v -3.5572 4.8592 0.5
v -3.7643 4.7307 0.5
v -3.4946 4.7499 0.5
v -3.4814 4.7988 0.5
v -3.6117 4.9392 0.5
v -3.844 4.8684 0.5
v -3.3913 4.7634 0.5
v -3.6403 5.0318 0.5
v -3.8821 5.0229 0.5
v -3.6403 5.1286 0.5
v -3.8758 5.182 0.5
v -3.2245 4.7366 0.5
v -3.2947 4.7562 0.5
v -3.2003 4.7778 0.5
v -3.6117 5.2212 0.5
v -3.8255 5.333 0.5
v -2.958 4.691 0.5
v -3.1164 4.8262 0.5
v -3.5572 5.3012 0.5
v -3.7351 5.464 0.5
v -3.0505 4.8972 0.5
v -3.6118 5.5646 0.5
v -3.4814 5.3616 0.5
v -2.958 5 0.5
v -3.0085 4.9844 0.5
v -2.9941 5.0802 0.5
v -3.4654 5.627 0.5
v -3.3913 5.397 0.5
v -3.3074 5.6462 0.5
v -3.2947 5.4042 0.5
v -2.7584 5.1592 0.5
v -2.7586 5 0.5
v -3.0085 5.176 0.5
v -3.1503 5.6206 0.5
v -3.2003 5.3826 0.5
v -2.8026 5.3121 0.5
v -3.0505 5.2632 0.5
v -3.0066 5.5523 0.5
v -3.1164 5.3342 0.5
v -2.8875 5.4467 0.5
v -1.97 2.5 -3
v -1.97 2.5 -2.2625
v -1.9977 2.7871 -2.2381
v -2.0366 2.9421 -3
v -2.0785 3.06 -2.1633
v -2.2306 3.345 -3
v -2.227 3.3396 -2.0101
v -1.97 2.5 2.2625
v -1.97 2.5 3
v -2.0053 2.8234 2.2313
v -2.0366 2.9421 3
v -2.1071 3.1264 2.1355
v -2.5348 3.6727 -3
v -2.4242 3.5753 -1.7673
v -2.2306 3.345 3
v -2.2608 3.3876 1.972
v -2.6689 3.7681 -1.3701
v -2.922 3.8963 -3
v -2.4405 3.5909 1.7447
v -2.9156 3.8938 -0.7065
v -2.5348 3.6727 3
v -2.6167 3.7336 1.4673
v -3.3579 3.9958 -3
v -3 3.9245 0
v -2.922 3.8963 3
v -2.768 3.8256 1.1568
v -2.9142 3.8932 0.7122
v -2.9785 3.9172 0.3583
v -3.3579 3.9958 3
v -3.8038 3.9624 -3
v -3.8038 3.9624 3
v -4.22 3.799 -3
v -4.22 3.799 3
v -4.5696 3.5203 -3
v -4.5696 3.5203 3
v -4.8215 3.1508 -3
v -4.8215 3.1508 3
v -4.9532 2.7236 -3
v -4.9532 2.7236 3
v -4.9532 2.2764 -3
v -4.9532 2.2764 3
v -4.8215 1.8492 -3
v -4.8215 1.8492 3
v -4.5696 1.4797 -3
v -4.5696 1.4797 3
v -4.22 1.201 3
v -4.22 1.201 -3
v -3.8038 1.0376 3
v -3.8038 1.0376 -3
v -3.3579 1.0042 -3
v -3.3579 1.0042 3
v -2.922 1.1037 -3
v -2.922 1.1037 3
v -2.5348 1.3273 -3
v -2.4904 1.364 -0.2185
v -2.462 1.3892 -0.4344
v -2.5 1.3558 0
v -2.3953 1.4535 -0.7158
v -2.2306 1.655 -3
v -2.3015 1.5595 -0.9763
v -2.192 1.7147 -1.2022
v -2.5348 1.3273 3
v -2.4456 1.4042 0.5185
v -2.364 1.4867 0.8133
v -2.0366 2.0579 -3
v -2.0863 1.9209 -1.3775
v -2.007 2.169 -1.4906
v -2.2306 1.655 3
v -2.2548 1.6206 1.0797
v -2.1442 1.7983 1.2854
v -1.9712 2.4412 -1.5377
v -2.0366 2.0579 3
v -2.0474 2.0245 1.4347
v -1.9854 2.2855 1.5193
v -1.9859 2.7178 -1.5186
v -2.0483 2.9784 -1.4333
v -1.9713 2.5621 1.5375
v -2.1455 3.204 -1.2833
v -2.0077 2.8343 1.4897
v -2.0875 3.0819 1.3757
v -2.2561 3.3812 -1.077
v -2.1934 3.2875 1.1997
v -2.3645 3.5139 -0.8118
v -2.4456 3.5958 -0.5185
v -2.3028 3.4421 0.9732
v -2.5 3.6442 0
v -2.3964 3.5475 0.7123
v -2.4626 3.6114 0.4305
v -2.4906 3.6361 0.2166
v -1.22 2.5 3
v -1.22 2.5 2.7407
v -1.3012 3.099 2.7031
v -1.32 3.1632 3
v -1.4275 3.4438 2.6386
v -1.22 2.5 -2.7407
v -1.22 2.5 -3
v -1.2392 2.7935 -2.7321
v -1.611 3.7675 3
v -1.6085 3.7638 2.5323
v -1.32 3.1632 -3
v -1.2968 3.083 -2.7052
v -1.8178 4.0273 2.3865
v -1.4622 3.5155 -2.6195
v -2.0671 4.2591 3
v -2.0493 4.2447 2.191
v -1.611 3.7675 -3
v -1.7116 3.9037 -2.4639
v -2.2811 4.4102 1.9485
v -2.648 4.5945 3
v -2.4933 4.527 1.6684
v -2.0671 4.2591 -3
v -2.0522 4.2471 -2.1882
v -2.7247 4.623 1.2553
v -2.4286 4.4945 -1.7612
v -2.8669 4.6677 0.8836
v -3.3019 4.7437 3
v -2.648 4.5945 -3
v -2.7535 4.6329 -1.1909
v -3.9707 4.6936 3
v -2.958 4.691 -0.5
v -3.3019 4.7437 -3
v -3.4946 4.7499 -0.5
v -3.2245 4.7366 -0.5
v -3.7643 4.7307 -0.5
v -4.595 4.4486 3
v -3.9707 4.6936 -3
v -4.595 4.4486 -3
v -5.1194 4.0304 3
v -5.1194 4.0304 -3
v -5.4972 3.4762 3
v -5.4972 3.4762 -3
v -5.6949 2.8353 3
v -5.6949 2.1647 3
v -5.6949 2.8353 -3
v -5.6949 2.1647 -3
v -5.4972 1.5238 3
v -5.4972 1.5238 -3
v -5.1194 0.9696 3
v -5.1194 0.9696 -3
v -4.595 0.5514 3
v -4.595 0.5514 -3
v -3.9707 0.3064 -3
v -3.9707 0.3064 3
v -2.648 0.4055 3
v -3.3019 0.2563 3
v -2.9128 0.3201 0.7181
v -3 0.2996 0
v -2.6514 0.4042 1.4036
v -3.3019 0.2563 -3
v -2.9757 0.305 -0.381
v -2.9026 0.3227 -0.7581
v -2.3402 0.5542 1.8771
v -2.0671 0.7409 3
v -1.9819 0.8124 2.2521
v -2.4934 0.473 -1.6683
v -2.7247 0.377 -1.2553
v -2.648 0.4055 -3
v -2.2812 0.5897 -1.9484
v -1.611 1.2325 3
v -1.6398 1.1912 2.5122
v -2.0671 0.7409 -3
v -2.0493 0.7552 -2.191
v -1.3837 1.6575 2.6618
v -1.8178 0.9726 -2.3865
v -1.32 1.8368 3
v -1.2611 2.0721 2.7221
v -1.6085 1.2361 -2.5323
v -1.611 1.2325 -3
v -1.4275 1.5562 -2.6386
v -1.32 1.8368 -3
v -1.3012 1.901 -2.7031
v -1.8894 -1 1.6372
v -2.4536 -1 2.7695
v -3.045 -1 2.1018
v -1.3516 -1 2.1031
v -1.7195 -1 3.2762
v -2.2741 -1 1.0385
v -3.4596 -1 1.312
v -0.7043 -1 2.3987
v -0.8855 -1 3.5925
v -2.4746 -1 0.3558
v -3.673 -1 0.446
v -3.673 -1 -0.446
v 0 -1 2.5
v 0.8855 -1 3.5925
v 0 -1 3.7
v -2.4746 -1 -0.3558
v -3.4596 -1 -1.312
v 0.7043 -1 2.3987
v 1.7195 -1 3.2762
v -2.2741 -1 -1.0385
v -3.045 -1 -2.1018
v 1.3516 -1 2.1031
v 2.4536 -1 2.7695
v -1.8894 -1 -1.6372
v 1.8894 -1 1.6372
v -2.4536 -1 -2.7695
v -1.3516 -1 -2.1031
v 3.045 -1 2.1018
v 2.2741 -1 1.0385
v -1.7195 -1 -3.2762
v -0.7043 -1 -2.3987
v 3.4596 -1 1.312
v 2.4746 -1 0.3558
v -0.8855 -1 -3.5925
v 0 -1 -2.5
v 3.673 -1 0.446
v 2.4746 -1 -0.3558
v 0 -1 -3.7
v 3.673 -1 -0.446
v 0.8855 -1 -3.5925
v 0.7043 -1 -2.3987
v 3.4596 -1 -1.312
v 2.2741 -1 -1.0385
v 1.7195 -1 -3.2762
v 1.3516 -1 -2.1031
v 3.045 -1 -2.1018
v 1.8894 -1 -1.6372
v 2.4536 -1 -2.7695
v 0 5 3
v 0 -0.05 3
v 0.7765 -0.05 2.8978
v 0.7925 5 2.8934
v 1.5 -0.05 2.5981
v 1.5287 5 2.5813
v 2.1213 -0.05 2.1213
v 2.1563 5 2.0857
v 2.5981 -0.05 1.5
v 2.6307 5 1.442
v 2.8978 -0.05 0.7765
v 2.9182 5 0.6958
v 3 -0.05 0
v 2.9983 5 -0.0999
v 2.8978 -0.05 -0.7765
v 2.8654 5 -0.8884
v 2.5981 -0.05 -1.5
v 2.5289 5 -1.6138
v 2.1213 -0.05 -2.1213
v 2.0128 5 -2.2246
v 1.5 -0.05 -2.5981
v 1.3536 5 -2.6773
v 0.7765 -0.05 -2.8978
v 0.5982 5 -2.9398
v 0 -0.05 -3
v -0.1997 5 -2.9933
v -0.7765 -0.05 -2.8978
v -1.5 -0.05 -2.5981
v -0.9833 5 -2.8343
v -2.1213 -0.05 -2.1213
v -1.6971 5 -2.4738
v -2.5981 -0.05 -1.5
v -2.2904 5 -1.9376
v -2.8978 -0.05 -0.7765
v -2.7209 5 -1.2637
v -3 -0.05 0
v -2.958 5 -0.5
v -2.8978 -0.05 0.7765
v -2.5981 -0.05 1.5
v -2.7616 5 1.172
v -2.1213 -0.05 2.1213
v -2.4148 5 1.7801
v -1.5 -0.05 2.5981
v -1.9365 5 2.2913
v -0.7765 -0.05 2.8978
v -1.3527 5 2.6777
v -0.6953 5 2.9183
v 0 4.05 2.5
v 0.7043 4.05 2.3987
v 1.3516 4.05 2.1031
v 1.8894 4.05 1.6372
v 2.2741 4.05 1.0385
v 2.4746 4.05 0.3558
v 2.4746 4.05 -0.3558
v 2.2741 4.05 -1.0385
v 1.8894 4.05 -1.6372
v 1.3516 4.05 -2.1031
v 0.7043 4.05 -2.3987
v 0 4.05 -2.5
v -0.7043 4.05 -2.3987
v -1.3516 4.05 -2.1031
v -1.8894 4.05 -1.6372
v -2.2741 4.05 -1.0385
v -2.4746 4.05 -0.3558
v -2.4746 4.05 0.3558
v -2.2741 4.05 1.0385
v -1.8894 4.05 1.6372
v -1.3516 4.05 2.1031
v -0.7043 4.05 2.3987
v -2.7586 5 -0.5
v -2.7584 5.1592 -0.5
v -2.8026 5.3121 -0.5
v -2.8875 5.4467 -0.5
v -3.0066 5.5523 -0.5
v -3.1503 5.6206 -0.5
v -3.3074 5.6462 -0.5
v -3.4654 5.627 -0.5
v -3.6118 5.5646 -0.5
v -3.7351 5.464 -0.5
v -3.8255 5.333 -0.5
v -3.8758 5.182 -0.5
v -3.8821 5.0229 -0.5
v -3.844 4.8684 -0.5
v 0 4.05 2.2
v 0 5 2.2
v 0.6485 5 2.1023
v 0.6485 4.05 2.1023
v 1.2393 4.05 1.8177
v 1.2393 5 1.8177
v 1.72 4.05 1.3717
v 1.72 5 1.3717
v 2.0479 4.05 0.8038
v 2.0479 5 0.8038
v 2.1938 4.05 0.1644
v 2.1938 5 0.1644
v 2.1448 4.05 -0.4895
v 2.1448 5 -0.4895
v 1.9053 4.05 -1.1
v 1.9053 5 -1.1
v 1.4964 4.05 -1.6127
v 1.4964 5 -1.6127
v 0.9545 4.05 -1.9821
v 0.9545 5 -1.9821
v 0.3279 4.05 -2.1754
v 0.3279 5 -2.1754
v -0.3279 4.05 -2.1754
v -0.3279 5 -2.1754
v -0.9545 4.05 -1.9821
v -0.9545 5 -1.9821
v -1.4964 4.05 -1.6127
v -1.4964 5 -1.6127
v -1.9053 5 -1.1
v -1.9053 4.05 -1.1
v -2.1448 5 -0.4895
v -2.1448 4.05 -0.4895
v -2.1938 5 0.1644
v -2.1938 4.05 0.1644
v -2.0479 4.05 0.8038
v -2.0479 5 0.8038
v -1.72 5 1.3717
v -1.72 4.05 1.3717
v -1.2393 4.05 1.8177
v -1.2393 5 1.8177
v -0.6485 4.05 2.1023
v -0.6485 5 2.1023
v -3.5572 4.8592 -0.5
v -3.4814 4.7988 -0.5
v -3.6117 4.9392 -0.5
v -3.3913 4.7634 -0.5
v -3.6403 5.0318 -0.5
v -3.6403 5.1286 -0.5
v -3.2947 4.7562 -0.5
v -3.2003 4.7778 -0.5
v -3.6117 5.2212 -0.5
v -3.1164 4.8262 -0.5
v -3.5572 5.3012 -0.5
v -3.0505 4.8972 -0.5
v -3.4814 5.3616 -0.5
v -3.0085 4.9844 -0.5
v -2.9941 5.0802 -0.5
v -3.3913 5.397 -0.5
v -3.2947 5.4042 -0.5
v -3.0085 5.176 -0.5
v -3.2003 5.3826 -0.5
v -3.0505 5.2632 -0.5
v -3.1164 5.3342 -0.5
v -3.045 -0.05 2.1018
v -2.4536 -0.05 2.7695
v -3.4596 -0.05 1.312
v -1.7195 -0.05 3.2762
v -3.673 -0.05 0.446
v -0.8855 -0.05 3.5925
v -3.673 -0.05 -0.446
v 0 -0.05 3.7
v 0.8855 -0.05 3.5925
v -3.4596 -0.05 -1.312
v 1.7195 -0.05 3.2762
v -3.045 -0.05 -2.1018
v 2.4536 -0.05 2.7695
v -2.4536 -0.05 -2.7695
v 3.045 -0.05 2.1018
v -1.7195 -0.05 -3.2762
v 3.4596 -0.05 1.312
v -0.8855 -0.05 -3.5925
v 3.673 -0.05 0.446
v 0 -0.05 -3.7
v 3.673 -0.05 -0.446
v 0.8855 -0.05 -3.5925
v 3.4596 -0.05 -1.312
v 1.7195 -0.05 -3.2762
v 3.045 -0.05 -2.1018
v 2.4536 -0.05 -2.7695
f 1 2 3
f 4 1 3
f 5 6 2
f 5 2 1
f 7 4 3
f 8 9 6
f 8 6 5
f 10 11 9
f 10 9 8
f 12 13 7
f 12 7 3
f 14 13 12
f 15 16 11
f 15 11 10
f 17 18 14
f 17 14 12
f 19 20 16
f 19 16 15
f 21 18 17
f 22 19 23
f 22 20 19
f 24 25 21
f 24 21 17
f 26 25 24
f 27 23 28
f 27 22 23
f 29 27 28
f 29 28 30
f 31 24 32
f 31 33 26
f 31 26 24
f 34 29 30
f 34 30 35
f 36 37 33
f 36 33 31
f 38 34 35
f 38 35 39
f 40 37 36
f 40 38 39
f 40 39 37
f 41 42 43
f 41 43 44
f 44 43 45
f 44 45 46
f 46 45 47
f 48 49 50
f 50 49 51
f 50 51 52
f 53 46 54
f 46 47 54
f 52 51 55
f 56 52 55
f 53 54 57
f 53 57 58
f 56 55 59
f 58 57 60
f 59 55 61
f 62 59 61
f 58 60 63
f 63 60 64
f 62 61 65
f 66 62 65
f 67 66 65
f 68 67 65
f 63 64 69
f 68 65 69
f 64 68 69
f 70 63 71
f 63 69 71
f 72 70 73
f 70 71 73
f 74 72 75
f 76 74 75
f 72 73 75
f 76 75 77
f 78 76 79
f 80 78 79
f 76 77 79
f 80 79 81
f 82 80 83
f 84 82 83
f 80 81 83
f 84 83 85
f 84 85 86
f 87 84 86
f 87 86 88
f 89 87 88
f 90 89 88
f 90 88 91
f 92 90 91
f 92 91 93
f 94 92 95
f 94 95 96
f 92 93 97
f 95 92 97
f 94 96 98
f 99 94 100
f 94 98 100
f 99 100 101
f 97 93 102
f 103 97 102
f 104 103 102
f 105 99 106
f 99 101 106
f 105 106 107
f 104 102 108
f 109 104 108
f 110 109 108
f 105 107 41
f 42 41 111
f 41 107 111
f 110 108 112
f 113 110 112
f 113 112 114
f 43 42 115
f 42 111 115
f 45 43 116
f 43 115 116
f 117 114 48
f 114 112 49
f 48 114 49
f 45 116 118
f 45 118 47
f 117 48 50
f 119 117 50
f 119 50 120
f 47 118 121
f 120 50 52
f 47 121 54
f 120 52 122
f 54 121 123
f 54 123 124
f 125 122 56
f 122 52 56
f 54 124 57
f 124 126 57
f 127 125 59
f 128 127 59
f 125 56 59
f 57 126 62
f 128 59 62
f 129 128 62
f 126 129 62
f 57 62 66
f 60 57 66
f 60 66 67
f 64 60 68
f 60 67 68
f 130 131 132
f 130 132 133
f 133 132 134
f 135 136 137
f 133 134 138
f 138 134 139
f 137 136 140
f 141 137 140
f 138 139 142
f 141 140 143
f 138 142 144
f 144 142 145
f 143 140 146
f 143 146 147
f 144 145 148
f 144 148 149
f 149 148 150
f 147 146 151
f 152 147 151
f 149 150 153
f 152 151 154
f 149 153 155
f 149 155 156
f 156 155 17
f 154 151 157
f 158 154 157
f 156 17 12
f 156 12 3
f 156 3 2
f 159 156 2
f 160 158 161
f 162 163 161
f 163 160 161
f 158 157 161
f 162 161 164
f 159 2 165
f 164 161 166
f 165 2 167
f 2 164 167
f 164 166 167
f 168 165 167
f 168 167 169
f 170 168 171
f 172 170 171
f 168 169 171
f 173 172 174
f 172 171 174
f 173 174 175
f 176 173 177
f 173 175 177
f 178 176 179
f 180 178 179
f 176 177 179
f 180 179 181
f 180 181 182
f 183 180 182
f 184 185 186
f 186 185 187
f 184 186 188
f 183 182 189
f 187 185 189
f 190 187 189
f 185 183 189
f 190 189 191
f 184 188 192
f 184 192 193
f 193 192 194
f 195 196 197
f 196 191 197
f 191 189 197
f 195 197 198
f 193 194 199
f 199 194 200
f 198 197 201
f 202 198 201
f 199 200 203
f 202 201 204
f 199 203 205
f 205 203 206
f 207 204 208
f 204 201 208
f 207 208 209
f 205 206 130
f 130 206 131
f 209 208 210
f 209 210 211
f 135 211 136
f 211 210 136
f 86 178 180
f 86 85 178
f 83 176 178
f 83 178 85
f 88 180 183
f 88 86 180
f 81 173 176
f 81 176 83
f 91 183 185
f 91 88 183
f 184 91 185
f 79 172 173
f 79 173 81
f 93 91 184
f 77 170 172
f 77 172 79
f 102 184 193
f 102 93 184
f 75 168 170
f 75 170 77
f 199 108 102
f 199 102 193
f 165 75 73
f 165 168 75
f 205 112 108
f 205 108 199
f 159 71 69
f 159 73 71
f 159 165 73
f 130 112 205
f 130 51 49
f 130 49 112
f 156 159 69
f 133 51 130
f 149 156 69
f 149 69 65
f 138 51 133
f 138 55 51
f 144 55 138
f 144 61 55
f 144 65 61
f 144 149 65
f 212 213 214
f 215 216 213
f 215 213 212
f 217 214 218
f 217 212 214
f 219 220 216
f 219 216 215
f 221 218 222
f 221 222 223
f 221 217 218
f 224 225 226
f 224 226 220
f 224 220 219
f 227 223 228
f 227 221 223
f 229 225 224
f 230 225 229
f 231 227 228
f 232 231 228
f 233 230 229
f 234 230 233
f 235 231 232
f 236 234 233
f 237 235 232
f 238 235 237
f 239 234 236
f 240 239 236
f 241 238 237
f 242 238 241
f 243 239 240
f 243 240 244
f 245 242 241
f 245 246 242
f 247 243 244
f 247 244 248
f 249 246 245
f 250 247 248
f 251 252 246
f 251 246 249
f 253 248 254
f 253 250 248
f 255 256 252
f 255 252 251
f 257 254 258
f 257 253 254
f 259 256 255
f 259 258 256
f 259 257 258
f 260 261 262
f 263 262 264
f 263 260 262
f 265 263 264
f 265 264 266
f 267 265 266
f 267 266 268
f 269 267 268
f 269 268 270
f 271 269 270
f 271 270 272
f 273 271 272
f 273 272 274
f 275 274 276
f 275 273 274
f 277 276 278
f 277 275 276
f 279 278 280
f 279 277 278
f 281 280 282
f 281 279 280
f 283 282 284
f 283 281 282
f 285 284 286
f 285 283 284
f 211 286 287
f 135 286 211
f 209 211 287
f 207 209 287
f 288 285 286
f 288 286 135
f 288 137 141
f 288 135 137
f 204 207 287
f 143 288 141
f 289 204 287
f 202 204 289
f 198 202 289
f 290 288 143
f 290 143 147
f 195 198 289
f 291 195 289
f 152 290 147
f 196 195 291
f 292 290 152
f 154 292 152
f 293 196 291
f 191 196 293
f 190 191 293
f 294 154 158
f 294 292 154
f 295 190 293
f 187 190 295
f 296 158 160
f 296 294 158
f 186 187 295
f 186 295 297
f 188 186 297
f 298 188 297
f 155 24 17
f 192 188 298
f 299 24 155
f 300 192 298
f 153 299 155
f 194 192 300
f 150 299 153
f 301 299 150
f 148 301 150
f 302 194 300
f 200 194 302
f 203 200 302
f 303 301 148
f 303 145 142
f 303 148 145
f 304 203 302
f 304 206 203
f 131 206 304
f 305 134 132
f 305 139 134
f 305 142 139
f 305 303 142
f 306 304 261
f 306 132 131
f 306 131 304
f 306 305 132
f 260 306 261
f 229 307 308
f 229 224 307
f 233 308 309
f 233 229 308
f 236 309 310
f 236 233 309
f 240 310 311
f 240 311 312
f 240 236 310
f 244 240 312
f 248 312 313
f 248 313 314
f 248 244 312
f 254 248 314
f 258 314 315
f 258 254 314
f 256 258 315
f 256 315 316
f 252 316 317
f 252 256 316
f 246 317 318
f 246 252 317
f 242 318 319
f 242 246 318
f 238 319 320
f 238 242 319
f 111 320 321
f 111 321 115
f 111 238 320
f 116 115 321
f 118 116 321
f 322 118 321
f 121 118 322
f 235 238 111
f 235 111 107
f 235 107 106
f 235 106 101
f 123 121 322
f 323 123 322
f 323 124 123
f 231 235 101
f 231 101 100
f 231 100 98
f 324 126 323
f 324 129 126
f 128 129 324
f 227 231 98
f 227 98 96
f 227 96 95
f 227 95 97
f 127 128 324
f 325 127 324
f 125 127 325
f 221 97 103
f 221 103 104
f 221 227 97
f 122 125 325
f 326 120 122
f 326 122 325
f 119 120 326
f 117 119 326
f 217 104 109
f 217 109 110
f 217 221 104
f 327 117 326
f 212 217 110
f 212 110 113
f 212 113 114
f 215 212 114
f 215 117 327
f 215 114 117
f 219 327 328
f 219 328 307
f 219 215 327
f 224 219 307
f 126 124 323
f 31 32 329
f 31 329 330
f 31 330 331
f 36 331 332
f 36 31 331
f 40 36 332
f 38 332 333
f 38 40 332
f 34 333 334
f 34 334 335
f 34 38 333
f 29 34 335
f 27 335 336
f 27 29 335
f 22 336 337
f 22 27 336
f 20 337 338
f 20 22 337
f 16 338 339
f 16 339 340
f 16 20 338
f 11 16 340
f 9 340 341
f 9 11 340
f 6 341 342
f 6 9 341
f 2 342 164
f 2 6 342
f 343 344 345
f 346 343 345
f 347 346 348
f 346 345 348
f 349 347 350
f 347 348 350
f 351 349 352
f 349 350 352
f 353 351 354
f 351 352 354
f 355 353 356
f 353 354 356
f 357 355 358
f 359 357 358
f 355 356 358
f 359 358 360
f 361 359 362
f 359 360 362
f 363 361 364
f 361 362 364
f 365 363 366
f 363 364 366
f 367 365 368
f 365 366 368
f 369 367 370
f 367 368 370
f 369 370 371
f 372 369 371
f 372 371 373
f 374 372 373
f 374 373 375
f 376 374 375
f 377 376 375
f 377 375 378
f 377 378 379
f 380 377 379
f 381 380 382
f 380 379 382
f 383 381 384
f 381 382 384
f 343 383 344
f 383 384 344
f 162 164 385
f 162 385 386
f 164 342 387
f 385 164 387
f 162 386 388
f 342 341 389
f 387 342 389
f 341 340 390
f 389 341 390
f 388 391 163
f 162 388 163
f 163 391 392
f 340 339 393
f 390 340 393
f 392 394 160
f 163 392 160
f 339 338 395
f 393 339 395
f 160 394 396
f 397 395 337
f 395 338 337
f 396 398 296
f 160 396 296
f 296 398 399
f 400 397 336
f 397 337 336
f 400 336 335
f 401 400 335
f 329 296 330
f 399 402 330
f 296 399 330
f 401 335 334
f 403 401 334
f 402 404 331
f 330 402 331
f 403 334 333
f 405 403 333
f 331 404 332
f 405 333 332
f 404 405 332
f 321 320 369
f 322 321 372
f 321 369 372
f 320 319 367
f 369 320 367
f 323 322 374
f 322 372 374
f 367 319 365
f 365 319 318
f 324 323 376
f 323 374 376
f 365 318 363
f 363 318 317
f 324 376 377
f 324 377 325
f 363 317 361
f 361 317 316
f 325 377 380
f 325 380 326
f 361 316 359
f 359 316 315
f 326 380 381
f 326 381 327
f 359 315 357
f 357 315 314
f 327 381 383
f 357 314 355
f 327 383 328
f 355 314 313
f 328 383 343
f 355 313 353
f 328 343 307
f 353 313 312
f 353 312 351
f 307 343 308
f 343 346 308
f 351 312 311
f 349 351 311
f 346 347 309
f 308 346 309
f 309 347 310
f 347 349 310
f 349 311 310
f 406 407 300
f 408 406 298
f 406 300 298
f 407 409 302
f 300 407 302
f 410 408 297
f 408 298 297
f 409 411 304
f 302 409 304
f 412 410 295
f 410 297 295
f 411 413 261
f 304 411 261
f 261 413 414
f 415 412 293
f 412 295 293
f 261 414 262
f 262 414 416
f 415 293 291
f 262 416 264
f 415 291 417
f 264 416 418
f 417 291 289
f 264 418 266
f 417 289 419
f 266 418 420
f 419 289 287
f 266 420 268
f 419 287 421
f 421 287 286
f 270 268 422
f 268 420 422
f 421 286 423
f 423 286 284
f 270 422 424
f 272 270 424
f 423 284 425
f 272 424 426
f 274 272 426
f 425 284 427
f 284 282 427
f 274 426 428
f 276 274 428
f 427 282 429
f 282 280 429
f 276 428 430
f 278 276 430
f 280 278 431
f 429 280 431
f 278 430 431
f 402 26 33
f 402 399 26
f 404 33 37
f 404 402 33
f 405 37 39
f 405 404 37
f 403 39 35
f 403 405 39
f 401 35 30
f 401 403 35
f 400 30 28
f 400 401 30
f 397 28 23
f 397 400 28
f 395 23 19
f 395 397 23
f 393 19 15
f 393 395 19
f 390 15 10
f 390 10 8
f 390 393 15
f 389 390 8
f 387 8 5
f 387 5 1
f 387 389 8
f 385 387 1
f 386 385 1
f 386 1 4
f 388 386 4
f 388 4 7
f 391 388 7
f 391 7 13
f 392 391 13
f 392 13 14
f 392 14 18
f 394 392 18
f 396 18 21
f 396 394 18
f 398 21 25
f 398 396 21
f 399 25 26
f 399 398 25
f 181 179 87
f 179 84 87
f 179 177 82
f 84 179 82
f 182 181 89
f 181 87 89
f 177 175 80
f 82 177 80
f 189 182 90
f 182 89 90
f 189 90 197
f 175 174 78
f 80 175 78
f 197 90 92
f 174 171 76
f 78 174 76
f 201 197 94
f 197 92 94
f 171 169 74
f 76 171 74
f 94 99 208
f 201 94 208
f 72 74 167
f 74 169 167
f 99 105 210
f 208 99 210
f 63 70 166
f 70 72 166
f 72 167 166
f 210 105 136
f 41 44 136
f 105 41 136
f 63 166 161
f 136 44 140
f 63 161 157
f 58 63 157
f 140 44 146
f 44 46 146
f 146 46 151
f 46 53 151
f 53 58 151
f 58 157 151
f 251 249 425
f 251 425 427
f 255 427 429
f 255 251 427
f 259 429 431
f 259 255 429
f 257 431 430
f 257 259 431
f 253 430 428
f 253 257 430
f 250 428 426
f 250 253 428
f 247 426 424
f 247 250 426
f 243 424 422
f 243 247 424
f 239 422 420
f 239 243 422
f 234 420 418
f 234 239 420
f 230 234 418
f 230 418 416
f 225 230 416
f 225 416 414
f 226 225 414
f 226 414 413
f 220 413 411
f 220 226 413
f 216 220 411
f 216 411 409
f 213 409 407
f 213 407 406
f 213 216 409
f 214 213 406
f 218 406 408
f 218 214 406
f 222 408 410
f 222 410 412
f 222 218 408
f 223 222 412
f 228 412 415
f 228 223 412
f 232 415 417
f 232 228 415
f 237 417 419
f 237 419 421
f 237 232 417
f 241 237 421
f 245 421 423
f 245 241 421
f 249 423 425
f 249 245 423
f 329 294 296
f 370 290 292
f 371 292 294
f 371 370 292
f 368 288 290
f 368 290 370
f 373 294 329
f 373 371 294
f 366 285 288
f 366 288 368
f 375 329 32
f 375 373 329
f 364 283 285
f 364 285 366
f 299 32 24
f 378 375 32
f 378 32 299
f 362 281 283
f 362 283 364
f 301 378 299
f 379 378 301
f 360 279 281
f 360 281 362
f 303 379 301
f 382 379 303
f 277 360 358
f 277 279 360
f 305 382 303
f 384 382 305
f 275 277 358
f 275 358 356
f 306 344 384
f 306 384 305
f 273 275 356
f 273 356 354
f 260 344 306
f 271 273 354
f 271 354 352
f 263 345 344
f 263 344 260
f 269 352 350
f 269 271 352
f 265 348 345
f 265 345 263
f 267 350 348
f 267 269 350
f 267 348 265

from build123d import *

# Parameters (mm, degrees)
BOSS_EXTRUDE1_DEPTH      = 5
BOSS_EXTRUDE1_DEPTH_BACK = 1
SKETCH1_R                = 3
SKETCH1_R_2              = 2.5
BOSS_EXTRUDE2_DEPTH      = 3
BOSS_EXTRUDE2_DEPTH_BACK = 3
SKETCH2_R                = 2.25
SKETCH2_R_2              = 1.5
SKETCH3_R                = 1.5
CUT_EXTRUDE1_DEPTH       = 10.680826584
SKETCH4_R                = 2.5
CUT_EXTRUDE2_DEPTH       = 9.815804089
BOSS_EXTRUDE3_DEPTH      = 0.5
BOSS_EXTRUDE3_DEPTH_BACK = 0.5
SKETCH5_R                = 0.566074209
SKETCH5_R_2              = 0.324906468
SKETCH6_R                = 3.7
SKETCH6_R_2              = 3
BOSS_EXTRUDE4_DEPTH      = 0.95
BOSS_EXTRUDE5_START      = -0.95
SKETCH7_R                = 2.5
SKETCH7_R_2              = 2.2
BOSS_EXTRUDE5_DEPTH      = 0.95


with BuildPart() as part:
    # Sketch1 → Boss-Extrude1 (new, two sides: drawn at the far end of the back side and taken through both)
    with BuildSketch(Plane(origin=(0, 0, 0), x_dir=(1, 0, 0), z_dir=(0, 1, 0)).offset(-BOSS_EXTRUDE1_DEPTH_BACK)):
        Circle(SKETCH1_R)
        Circle(SKETCH1_R_2, mode=Mode.SUBTRACT)
    extrude(amount=BOSS_EXTRUDE1_DEPTH + BOSS_EXTRUDE1_DEPTH_BACK)

    # Sketch2 → Boss-Extrude2 (add, two sides: drawn at the far end of the back side and taken through both)
    with BuildSketch(Plane.XY.offset(-BOSS_EXTRUDE2_DEPTH_BACK)):
        with Locations((-3.47, 2.5)):
            Circle(SKETCH2_R)
        with Locations((-3.47, 2.5)):
            Circle(SKETCH2_R_2, mode=Mode.SUBTRACT)
    extrude(amount=BOSS_EXTRUDE2_DEPTH + BOSS_EXTRUDE2_DEPTH_BACK)

    # Sketch3 → Cut-Extrude1 (cut, through all)
    with BuildSketch(Plane.XY.offset(3)):
        with Locations((-3.47, 2.5)):
            Circle(SKETCH3_R)
    extrude(amount=-CUT_EXTRUDE1_DEPTH, mode=Mode.SUBTRACT)

    # Sketch4 → Cut-Extrude2 (cut, through all)
    with BuildSketch(Plane(origin=(0, 5, 0), x_dir=(1, 0, 0), z_dir=(0, 1, 0))):
        Circle(SKETCH4_R)
    extrude(amount=-CUT_EXTRUDE2_DEPTH, mode=Mode.SUBTRACT)

    # Sketch5 → Boss-Extrude3 (add, two sides: drawn at the far end of the back side and taken through both)
    with BuildSketch(Plane.XY.offset(-BOSS_EXTRUDE3_DEPTH_BACK)):
        with Locations((-3.318977868, 5.08019985)):
            Circle(SKETCH5_R)
        with Locations((-3.318977868, 5.08019985)):
            Circle(SKETCH5_R_2, mode=Mode.SUBTRACT)
    extrude(amount=BOSS_EXTRUDE3_DEPTH + BOSS_EXTRUDE3_DEPTH_BACK)

    # Sketch6 → Boss-Extrude4 (add)
    with BuildSketch(Plane.XZ.offset(1)):
        Circle(SKETCH6_R)
        Circle(SKETCH6_R_2, mode=Mode.SUBTRACT)
    extrude(amount=-BOSS_EXTRUDE4_DEPTH)

    # Sketch7 → Boss-Extrude5 (add)
    with BuildSketch(Plane(origin=(0, 5, 0), x_dir=(1, 0, 0), z_dir=(0, 1, 0)).offset(BOSS_EXTRUDE5_START)):
        Circle(SKETCH7_R)
        Circle(SKETCH7_R_2, mode=Mode.SUBTRACT)
    extrude(amount=BOSS_EXTRUDE5_DEPTH)


solid = part.part
